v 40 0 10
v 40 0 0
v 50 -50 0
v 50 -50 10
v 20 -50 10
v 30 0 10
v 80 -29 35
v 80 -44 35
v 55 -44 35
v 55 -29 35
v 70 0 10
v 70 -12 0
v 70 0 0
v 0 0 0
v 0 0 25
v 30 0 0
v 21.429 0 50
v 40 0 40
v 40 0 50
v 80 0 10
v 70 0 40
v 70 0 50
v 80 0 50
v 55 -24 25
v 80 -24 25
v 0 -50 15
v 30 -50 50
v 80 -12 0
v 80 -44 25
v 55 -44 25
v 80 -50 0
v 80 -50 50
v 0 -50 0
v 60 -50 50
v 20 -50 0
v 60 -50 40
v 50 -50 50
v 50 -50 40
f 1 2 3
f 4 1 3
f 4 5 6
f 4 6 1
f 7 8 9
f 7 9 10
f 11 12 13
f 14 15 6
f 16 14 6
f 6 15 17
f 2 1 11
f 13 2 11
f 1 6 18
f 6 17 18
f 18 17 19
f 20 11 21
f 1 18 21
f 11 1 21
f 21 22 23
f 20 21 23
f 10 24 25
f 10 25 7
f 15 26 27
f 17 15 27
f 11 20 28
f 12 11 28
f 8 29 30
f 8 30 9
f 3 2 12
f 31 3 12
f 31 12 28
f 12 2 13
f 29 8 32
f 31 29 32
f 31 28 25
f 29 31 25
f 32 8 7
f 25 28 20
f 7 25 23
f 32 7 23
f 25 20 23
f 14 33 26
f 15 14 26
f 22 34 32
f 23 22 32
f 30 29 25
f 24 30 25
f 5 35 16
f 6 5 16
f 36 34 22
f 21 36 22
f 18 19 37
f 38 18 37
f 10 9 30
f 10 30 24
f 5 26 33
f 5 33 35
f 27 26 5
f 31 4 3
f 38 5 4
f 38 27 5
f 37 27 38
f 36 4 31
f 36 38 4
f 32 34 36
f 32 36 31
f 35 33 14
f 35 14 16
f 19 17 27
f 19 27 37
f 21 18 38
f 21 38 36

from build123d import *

# Parameters (mm, degrees)
F0_W     = 80
F0_H     = 50
F1_DEPTH = 50
F4_DEPTH = 10
F5_W     = 15
F5_H     = 10
F6_DEPTH = 25
F7_DEPTH = 10
F9_DEPTH = 10


with BuildPart() as f1:
    # F0 (on Front) → F1 (new body)
    with BuildSketch(Plane.XZ):
        with Locations((40, 25)):
            Rectangle(F0_W, F0_H)
    extrude(amount=F1_DEPTH)

    # F2 (on face) → F4 (cut)
    with BuildSketch(Plane.XY.offset(50)):
        Polygon((70, 0), (40, 0), (50, -50), (60, -50), align=None)
    extrude(amount=-F4_DEPTH, mode=Mode.SUBTRACT)

    # F5 (on face) → F6 (cut)
    with BuildSketch(Plane.YZ.offset(80)):
        with Locations((-36.5, 30)):
            Rectangle(F5_W, F5_H)
        Polygon((-29, 35), (-29, 25), (-24, 25), align=None)
    extrude(amount=-F6_DEPTH, mode=Mode.SUBTRACT)

    # F5 (on face) → F7 (cut)
    with BuildSketch(Plane.YZ.offset(80)):
        Polygon((0, 10), (-12, 0), (0, 0), align=None)
    extrude(amount=-F7_DEPTH, mode=Mode.SUBTRACT)

    # F8 (on face) → F9 (cut)
    with BuildSketch(Plane(origin=(0, 0, 0), x_dir=(1, 0, 0), z_dir=(0, 0, -1))):
        Polygon((20, 50), (30, 0), (40, 0), (50, 50), align=None)
    extrude(amount=-F9_DEPTH, mode=Mode.SUBTRACT)

    # F12: sweep along a path in F3
    with BuildLine(Plane(origin=(0, 0, 0), x_dir=(0, -1, 0), z_dir=(-1, 0, 0))) as f12_path:
        Line((50, 15), (0, 25))
    # F11 (on face) → F12 (sweep, cut)
    with BuildSketch(Plane.XZ.offset(50)):
        Polygon((0, 15), (30, 50), (0, 50), align=None)
    sweep(path=f12_path.line, mode=Mode.SUBTRACT)


solid = f1.part
